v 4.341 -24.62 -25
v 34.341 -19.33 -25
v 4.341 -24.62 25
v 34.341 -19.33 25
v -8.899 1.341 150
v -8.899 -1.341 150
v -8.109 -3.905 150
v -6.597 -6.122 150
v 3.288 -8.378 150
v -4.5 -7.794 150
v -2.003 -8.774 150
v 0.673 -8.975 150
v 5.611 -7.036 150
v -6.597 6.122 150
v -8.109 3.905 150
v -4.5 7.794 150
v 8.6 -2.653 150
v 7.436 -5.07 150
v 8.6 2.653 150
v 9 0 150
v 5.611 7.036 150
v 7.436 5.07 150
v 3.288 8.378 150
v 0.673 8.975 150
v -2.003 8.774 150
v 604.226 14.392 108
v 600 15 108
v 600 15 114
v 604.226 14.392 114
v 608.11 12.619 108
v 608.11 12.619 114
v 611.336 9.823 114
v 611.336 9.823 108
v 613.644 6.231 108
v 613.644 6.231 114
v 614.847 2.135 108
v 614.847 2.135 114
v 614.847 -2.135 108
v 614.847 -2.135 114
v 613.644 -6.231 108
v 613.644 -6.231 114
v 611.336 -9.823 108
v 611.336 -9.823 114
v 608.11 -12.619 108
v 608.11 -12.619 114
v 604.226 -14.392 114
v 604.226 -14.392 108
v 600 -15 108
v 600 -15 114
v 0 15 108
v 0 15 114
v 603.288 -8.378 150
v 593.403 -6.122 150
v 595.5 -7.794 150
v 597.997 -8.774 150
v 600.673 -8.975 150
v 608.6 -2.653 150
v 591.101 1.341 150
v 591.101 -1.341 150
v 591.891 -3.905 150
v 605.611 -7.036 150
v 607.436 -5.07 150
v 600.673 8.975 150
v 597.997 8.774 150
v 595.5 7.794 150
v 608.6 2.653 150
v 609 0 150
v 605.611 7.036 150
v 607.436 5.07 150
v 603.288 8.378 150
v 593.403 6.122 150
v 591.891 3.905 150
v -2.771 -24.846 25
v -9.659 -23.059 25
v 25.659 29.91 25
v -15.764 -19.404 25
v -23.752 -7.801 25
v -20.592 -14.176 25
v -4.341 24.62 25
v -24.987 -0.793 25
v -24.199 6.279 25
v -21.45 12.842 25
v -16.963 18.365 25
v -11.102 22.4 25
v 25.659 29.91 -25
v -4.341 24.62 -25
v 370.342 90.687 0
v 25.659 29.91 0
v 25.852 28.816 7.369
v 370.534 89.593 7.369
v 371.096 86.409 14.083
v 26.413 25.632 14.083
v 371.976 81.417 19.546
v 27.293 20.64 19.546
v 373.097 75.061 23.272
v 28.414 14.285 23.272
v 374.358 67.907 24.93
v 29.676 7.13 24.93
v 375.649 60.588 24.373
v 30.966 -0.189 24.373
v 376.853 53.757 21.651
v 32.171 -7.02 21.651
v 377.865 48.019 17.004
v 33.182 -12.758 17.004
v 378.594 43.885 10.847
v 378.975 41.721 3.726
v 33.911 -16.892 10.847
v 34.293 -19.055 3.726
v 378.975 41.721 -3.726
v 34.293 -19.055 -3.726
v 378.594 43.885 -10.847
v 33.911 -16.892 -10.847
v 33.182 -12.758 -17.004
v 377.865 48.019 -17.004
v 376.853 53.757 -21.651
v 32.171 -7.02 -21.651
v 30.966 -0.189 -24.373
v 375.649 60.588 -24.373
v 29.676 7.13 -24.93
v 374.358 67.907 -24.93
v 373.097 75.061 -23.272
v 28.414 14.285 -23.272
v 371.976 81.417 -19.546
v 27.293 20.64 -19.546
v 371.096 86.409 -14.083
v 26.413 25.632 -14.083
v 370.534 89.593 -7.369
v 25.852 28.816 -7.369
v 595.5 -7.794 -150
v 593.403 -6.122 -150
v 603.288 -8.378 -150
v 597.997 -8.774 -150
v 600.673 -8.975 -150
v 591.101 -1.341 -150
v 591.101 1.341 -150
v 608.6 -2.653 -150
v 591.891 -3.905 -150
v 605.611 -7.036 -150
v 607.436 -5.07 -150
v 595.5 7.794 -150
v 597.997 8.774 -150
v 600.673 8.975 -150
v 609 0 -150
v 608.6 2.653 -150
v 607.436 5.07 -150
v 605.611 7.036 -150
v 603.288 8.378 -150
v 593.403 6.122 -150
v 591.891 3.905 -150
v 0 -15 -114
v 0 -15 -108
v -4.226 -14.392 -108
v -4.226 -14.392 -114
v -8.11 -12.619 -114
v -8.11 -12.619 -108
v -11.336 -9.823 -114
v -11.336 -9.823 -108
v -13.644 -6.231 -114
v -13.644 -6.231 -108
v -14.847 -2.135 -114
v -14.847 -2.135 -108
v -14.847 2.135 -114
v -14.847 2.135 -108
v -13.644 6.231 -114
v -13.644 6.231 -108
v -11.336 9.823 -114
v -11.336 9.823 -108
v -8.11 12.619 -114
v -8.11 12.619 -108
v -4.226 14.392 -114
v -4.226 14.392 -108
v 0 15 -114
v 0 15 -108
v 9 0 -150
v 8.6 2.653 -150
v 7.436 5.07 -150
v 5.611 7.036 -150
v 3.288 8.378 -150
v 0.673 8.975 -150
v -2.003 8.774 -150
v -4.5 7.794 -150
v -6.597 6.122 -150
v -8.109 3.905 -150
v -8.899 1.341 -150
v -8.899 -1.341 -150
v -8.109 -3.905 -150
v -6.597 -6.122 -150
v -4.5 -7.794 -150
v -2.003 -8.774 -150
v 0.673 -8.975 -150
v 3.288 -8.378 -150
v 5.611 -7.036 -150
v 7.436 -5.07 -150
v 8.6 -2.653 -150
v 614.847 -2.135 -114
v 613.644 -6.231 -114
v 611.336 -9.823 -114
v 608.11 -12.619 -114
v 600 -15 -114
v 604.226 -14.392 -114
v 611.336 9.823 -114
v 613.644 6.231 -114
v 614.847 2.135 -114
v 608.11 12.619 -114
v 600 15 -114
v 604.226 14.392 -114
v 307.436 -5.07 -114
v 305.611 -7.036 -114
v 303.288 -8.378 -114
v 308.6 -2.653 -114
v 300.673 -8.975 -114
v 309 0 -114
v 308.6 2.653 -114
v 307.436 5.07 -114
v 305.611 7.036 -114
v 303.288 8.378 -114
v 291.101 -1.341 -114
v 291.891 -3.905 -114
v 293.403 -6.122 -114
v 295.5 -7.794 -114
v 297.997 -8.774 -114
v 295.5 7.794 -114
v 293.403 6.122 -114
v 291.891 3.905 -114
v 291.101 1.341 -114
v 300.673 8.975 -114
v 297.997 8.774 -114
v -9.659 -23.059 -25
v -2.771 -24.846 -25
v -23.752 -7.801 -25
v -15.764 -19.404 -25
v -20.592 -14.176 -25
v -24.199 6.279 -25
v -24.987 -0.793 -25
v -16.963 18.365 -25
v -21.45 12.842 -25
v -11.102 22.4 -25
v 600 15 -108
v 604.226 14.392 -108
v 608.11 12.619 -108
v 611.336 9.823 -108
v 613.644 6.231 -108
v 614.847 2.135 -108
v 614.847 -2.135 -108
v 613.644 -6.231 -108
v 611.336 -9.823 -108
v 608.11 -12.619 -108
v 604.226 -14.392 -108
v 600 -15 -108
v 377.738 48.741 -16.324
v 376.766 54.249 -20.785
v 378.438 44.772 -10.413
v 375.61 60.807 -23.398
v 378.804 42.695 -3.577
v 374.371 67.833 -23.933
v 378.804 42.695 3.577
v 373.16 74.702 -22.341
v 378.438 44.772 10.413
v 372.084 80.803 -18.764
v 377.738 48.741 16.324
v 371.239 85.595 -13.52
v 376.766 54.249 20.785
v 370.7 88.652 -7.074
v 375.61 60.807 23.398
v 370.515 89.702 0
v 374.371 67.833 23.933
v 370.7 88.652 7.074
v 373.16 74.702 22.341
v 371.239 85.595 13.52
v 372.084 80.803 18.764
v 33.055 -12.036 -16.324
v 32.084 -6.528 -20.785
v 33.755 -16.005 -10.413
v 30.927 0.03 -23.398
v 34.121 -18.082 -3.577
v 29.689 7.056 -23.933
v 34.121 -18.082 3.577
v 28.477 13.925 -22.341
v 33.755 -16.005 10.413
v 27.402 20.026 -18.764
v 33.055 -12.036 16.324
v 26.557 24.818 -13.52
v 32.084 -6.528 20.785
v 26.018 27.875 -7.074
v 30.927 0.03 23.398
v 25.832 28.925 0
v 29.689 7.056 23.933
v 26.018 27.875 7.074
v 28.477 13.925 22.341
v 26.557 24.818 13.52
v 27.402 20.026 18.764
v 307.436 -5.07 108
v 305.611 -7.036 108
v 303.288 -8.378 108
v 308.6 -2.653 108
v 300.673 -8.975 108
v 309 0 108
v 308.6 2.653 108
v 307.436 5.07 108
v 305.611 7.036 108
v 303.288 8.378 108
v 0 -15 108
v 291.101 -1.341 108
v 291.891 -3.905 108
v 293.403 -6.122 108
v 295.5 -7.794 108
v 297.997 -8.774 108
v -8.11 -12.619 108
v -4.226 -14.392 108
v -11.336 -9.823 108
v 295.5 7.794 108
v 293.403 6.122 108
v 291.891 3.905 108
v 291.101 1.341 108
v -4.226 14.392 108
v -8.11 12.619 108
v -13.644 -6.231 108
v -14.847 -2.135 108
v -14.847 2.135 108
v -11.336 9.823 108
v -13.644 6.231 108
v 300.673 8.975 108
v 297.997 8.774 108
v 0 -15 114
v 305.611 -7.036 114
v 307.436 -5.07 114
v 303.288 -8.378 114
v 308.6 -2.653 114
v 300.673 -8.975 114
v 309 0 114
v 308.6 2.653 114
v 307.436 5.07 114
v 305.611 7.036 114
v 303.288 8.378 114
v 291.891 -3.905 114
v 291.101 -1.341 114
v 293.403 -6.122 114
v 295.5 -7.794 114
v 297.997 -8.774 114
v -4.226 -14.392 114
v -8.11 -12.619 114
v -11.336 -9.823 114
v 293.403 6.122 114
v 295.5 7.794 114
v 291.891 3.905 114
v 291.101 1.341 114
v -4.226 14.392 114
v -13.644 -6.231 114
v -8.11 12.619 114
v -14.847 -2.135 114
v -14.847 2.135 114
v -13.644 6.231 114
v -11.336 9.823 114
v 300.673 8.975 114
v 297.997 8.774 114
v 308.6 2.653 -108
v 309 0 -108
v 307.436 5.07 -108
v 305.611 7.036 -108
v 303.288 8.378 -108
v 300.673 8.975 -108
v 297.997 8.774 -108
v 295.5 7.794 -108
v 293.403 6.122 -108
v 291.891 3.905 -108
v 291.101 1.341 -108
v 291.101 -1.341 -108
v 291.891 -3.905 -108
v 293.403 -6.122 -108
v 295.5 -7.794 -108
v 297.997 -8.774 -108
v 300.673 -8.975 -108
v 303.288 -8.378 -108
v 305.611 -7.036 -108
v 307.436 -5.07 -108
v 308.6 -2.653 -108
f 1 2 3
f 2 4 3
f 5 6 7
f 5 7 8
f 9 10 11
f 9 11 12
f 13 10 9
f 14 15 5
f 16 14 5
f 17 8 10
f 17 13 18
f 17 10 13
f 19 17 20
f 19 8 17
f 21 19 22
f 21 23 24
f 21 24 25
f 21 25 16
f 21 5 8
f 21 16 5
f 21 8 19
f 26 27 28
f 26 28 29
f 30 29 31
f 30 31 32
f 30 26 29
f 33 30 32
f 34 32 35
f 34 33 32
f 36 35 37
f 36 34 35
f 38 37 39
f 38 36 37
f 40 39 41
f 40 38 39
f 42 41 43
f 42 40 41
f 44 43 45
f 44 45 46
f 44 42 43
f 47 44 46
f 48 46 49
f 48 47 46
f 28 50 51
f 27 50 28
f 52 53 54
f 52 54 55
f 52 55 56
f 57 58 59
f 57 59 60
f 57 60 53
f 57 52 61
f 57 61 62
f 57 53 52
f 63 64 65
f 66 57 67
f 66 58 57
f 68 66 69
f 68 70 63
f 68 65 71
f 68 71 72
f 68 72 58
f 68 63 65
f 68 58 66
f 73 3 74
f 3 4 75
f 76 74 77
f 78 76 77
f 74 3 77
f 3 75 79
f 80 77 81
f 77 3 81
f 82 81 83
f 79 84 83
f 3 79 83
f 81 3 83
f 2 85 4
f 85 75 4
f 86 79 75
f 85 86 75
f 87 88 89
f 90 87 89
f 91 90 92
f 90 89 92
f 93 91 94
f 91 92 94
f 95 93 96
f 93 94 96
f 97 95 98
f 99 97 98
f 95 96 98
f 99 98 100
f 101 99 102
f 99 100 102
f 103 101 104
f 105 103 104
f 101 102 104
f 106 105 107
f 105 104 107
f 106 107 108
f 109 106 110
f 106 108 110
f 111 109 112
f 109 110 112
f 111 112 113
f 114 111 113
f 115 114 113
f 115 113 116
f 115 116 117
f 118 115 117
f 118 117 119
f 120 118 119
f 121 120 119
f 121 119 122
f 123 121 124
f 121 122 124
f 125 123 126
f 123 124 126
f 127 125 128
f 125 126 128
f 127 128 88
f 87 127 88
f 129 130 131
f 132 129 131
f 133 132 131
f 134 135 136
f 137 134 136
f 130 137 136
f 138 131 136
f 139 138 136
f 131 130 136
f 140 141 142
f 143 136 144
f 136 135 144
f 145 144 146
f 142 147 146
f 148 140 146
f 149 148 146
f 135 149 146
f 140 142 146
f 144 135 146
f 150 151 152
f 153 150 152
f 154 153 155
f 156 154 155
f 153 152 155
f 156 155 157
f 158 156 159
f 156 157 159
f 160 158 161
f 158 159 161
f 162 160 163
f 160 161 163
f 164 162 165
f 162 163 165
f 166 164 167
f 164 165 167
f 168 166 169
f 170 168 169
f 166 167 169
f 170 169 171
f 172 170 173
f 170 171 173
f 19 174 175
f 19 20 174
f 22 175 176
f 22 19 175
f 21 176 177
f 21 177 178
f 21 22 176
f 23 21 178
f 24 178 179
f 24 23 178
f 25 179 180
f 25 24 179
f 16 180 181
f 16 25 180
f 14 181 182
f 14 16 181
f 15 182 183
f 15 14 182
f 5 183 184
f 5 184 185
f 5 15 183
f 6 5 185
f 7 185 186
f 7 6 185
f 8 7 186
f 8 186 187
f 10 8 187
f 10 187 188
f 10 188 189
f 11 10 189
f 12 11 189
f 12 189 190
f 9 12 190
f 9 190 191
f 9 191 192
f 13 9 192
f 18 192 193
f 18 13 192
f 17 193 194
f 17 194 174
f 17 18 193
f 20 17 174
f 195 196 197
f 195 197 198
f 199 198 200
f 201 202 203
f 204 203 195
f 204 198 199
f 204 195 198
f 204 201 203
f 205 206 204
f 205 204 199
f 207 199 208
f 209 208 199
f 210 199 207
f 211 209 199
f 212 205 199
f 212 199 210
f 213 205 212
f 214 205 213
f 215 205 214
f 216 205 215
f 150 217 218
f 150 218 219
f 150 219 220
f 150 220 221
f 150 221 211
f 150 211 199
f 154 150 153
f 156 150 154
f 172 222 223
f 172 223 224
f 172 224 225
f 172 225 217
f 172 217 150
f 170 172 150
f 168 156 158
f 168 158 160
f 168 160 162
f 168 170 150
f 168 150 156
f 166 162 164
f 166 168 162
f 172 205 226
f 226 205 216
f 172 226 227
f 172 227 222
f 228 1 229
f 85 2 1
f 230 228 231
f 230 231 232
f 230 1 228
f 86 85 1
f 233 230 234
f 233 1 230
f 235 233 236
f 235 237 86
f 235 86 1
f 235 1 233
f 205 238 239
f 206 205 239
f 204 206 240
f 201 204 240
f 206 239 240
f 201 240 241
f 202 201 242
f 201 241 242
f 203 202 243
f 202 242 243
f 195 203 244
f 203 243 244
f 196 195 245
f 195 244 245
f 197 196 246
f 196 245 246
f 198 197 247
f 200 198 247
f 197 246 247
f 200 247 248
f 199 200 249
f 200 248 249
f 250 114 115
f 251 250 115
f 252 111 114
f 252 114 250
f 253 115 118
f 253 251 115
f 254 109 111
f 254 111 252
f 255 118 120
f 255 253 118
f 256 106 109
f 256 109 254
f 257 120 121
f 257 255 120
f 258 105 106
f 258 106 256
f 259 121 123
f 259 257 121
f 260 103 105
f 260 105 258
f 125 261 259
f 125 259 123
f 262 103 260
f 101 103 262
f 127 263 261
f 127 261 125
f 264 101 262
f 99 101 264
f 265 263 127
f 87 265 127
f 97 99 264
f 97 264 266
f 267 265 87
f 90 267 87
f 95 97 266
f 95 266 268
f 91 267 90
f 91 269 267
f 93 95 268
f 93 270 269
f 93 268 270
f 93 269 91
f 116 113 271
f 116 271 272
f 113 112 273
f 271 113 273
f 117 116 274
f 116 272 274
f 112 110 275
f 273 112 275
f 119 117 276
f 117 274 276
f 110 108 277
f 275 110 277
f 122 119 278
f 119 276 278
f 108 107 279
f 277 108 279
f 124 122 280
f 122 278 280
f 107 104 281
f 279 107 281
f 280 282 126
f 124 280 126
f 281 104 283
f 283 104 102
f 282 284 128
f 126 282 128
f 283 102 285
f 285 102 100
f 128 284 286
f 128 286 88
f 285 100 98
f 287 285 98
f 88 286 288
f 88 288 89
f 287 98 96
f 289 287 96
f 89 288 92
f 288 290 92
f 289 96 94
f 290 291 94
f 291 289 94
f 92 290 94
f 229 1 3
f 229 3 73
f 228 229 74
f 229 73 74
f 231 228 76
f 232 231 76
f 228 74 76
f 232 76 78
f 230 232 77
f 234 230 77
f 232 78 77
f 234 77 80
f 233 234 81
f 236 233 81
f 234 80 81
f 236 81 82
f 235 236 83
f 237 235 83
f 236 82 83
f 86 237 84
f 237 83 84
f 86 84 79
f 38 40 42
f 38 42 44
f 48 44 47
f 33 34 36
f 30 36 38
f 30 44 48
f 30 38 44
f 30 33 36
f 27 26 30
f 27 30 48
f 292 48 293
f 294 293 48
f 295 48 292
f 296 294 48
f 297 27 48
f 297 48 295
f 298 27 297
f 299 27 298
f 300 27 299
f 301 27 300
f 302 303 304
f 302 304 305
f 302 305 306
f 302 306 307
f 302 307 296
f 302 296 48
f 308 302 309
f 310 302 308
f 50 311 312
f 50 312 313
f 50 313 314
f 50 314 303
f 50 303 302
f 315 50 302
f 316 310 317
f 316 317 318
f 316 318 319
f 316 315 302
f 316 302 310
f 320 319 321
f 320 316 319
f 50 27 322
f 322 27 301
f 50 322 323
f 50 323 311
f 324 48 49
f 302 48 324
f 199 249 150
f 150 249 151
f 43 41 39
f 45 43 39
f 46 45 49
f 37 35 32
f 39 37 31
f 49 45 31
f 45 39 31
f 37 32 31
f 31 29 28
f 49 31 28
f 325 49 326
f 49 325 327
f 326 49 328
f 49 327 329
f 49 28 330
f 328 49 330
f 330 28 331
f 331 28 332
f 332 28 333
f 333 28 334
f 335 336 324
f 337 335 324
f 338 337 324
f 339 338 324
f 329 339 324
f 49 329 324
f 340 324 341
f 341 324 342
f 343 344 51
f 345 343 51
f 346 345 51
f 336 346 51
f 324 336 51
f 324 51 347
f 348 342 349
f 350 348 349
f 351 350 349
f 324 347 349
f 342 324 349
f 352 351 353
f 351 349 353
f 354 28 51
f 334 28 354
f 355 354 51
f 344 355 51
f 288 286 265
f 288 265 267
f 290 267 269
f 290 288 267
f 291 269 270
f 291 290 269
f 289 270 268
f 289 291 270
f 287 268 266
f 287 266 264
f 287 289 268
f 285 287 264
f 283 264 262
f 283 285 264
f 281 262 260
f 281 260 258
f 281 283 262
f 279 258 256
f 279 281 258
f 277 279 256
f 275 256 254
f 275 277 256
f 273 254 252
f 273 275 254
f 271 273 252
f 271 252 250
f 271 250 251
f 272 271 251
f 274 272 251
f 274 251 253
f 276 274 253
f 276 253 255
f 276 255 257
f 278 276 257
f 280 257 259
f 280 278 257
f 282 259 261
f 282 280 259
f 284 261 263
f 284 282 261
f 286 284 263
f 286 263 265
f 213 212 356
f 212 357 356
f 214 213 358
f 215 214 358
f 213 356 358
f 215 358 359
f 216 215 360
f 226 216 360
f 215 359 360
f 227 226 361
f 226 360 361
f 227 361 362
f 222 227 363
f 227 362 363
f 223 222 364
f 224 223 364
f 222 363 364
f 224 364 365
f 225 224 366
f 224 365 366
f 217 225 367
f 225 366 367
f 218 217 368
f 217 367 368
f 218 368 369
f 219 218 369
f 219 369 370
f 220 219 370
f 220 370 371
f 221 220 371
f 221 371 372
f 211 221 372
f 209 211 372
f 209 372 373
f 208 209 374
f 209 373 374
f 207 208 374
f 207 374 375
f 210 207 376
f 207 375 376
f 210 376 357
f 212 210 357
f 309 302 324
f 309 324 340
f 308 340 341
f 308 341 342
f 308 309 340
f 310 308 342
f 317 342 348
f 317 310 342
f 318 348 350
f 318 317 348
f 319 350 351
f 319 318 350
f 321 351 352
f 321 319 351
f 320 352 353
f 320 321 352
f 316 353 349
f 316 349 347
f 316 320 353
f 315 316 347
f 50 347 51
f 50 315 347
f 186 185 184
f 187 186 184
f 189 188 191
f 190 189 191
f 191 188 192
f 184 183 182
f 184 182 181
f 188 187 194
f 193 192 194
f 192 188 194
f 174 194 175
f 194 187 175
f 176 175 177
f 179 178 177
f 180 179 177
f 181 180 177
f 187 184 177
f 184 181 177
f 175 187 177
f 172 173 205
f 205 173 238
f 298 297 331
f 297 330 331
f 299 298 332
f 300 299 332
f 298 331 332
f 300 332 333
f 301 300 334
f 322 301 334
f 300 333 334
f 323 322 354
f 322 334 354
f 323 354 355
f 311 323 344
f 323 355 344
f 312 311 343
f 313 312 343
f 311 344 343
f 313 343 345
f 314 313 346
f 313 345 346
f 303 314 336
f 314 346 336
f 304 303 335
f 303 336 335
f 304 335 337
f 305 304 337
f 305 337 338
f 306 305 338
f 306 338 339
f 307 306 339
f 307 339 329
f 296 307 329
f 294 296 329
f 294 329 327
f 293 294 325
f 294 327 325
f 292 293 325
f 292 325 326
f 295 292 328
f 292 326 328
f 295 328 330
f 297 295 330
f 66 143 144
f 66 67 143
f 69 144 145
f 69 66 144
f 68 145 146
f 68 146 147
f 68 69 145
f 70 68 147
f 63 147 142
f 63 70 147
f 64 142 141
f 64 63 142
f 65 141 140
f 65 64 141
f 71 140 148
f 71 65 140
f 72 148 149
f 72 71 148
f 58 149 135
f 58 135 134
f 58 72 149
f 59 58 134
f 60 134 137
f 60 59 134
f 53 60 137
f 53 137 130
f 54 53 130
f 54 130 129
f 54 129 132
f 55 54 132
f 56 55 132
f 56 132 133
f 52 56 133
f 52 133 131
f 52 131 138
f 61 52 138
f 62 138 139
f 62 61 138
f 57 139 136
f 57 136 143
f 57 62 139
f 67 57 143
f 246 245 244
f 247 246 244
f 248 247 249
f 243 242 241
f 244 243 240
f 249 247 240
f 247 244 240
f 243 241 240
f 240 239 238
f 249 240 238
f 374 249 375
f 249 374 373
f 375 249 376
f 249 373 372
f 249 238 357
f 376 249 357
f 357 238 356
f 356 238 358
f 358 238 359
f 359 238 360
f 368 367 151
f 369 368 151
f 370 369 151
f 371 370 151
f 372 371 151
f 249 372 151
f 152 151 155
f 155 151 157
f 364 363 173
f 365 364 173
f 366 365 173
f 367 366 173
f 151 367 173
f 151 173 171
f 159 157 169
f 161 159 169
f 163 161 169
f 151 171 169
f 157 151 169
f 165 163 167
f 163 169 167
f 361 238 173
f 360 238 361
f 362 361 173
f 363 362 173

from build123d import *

# Parameters (mm, degrees)
SKETCH_1_R          = 15
EXTRUDE_1_DEPTH     = 250
EXTRUDE_1_2_DEPTH   = 250
EXTRUDE_2_DEPTH     = 10
SKETCH_3_R          = 15
CUT_EXTRUDE_1_DEPTH = 250
EXTRUDE_3_DEPTH     = 25
SKETCH_5_R          = 25
SKETCH_5_R_2        = 24
EXTRUDE_4_DEPTH     = 350
SCALE_1_SCALE       = 0.6


with BuildPart() as part:
    # 草图1 → 凸台-拉伸1 (new, symmetric)
    with BuildSketch(Plane.XY):
        Circle(SKETCH_1_R)
    extrude(amount=EXTRUDE_1_DEPTH, both=True)


with BuildPart() as body_2:
    # 草图1 → Extrude 1 2 (new, symmetric)
    with BuildSketch(Plane.XY):
        with Locations((1000, 0)):
            Circle(SKETCH_1_R)
    extrude(amount=EXTRUDE_1_2_DEPTH, both=True)


with BuildPart() as body_3:
    # 草图2 → 凸台-拉伸2 (new body)
    with BuildSketch(Plane.XY.offset(180)):
        with BuildLine():
            Line((0, 25), (1000, 25))
            ThreePointArc((1000, 25), (1025, 0), (1000, -25))
            Line((1000, -25), (0, -25))
            ThreePointArc((0, -25), (-25, 0), (0, 25))
        make_face()
    extrude(amount=EXTRUDE_2_DEPTH)


with BuildPart() as body_4:
    # 镜向2: mirrored copy
    add(body_3.part.mirror(Plane.XY))


with BuildPart() as cut_extrude_1_tool:
    # 草图3 → 切除-拉伸1 (new, symmetric)
    with BuildSketch(Plane.XY):
        with Locations((500, 0)):
            Circle(SKETCH_3_R)
    extrude(amount=CUT_EXTRUDE_1_DEPTH, both=True)


with BuildPart() as body_3_1:
    add(body_3.part)

    # 切除-拉伸1: cut by cut_extrude_1_tool
    add(cut_extrude_1_tool.part, mode=Mode.SUBTRACT)


with BuildPart() as body_4_1:
    add(body_4.part)

    # 切除-拉伸1: cut by cut_extrude_1_tool
    add(cut_extrude_1_tool.part, mode=Mode.SUBTRACT)


with BuildPart() as body_5:
    # 草图4 → 凸台-拉伸3 (new, symmetric)
    with BuildSketch(Plane.XY):
        with BuildLine():
            Line((-4.341204442, 24.620193825), (25.658795558, 29.910003247))
            Line((25.658795558, 29.910003247), (34.341204442, -19.330384404))
            Line((34.341204442, -19.330384404), (4.341204442, -24.620193825))
            ThreePointArc((4.341204442, -24.620193825), (-24.620193825, -4.341204442), (-4.341204442, 24.620193825))
        make_face()
    extrude(amount=EXTRUDE_3_DEPTH, both=True)


with BuildPart() as body_6:
    # 草图5 → 凸台-拉伸4 (new body)
    with BuildSketch(Plane(origin=(30, 5.289809421, 0), x_dir=(0, 0, -1), z_dir=(0.9848077530122079, 0.17364817766693116, 0))):
        with Locations(Location((0, 0, 0), (0, 0, 90))):
            Circle(SKETCH_5_R)
        with Locations(Location((0, 0, 0), (0, 0, 90))):
            Circle(SKETCH_5_R_2, mode=Mode.SUBTRACT)
    extrude(amount=EXTRUDE_4_DEPTH)


with BuildPart() as body_2_1:
    # 缩放比例1: scaled about (0, 0, 0)
    add(body_2.part.scale(SCALE_1_SCALE))


with BuildPart() as body_4_2:
    # 缩放比例1: scaled about (0, 0, 0)
    add(body_4_1.part.scale(SCALE_1_SCALE))


with BuildPart() as part_1:
    # 缩放比例1: scaled about (0, 0, 0)
    add(part.part.scale(SCALE_1_SCALE))


with BuildPart() as body_3_2:
    # 缩放比例1: scaled about (0, 0, 0)
    add(body_3_1.part.scale(SCALE_1_SCALE))


solid = Compound([body_5.part, body_6.part, body_2_1.part, body_4_2.part, part_1.part, body_3_2.part])
